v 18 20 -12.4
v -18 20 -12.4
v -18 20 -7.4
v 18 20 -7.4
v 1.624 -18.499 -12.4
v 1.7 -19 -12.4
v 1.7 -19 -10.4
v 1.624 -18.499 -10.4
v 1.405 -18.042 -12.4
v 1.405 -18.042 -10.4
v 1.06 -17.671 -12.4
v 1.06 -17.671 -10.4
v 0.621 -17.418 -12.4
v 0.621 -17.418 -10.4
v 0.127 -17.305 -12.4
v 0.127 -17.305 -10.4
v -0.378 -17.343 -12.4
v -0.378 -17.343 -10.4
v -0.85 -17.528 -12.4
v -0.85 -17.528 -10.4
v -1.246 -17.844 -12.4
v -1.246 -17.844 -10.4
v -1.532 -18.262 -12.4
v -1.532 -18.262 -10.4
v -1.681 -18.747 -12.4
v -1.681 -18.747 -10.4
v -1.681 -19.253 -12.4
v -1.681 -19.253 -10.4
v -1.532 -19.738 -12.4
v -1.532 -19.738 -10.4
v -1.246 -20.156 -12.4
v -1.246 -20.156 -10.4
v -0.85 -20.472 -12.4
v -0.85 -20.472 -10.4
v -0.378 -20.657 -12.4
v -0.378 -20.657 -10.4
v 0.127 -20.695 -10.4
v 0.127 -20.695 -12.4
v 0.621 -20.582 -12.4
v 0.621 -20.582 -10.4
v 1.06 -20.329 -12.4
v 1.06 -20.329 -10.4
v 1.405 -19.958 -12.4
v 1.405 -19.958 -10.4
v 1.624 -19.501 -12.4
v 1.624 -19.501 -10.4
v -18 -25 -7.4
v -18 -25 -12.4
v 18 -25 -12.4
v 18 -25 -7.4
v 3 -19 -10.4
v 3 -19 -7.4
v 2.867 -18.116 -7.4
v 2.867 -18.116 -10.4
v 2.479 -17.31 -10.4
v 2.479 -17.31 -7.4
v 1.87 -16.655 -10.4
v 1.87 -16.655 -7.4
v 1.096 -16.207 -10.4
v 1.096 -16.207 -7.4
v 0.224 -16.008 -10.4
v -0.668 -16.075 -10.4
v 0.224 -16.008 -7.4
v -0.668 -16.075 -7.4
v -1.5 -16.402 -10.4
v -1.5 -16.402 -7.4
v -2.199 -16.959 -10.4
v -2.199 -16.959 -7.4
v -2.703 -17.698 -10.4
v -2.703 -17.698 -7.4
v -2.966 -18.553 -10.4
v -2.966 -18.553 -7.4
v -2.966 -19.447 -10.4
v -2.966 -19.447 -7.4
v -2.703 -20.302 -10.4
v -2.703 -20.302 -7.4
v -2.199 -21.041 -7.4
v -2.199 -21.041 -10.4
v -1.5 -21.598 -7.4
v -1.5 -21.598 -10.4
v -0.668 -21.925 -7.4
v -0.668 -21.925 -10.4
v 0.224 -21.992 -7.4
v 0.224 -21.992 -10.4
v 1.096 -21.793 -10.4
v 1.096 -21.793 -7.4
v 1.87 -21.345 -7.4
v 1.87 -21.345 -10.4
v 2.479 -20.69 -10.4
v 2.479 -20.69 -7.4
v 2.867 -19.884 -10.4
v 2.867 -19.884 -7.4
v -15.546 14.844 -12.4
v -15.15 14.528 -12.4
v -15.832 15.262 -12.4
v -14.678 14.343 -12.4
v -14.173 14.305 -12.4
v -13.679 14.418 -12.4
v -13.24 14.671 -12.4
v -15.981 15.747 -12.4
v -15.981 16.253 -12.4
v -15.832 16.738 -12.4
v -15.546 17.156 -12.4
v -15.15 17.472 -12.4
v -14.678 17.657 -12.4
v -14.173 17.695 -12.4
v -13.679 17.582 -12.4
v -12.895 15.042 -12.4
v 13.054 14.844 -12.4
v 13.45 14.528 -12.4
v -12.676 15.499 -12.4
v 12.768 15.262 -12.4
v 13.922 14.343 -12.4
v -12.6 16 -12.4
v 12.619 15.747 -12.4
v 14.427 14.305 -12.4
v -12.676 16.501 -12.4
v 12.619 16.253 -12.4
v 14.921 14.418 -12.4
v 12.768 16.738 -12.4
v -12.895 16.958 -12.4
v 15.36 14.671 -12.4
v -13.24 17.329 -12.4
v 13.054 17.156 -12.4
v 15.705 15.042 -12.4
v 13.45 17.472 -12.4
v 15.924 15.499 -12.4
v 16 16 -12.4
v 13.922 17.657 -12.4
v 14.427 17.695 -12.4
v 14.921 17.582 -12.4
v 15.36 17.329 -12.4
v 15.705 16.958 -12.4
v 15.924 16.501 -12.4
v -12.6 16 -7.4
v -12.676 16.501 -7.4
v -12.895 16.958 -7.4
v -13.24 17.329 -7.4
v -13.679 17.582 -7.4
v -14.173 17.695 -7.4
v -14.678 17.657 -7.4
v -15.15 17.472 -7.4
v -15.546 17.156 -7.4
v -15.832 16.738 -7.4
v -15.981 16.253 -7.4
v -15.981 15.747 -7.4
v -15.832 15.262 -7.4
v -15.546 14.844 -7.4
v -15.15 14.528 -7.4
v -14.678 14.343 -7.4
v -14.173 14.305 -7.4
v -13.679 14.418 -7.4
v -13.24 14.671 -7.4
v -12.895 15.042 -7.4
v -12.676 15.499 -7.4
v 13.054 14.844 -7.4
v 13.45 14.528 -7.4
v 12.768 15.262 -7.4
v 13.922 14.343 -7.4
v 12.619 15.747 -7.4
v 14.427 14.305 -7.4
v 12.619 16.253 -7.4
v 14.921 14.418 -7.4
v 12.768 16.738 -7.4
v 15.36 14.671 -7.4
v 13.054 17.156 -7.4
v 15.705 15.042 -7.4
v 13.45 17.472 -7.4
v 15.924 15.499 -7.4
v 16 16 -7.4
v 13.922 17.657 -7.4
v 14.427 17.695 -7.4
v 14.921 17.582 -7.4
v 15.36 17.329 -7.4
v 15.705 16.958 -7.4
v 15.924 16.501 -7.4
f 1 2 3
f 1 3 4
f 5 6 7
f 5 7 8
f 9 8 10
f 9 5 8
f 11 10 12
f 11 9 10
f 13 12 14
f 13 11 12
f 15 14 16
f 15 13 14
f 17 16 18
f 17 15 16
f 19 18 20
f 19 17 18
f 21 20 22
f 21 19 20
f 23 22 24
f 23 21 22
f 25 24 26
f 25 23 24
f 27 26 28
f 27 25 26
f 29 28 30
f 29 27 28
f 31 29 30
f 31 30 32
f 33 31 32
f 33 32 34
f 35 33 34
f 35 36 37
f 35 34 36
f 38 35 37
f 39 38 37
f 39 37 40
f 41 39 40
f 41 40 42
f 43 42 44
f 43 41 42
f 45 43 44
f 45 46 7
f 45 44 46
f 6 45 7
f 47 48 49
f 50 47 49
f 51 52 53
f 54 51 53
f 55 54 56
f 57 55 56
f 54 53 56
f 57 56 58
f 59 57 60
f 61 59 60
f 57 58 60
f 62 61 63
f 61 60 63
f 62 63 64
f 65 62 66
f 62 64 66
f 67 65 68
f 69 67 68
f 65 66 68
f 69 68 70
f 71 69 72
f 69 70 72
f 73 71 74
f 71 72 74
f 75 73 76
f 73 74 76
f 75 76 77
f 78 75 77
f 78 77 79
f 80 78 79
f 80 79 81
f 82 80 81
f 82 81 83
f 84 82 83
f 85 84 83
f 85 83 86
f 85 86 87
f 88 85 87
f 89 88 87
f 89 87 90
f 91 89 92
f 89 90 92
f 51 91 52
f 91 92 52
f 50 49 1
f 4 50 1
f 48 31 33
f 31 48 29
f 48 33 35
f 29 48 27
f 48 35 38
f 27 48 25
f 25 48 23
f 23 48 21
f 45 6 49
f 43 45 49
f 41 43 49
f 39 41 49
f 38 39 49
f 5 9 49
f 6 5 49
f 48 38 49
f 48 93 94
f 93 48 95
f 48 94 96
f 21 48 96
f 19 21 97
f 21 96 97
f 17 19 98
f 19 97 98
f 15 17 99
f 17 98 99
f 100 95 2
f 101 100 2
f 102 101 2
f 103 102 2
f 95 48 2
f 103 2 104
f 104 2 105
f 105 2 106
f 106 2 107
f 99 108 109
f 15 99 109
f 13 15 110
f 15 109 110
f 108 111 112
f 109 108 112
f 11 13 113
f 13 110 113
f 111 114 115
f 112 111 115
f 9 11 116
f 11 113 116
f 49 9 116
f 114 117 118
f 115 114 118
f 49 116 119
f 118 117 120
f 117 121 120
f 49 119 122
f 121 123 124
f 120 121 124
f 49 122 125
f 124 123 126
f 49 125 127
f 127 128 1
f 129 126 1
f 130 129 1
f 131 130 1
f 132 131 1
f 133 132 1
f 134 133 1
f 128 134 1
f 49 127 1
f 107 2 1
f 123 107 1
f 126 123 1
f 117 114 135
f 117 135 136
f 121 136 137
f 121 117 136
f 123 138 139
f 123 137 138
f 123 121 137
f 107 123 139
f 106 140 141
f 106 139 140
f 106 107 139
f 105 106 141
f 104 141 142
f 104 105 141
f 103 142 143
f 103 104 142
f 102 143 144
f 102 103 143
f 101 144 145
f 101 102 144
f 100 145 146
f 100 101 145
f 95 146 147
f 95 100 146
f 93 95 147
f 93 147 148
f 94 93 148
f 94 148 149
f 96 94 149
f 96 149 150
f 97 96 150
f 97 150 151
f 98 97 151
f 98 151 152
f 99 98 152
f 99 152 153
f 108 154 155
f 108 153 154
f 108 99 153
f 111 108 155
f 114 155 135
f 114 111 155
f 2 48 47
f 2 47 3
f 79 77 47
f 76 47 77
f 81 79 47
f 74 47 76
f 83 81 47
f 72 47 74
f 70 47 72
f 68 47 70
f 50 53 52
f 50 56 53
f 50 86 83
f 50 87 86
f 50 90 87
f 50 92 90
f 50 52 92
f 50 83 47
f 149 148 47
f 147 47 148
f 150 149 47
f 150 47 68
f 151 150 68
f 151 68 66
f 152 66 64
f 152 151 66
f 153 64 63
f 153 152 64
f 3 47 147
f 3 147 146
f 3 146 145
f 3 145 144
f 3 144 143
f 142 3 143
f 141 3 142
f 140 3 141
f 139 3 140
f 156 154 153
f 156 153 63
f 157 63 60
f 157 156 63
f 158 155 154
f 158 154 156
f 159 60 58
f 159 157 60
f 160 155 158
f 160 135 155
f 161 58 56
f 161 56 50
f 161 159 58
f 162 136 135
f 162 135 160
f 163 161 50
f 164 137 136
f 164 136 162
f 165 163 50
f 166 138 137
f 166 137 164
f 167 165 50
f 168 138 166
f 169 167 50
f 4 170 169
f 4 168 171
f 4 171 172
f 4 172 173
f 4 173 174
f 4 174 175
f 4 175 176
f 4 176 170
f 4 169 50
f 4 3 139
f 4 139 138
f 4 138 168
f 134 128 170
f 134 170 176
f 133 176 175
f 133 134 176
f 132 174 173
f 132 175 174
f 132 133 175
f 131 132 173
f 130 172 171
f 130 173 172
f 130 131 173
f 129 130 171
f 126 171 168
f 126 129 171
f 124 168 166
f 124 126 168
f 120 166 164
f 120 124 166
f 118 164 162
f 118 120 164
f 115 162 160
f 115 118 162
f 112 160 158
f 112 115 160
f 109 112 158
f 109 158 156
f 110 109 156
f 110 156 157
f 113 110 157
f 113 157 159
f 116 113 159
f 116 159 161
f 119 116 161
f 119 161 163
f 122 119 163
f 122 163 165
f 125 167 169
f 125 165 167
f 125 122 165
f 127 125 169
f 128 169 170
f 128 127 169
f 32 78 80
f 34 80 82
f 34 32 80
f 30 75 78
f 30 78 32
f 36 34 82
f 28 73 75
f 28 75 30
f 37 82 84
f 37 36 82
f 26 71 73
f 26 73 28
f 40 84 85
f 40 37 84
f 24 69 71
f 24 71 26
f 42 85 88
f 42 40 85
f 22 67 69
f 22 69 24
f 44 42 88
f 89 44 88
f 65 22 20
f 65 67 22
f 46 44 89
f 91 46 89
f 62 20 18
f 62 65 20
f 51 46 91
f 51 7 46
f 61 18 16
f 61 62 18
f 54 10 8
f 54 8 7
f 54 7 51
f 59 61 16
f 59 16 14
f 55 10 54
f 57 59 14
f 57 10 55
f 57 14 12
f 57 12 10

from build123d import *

# Parameters (mm, degrees)
SKETCH025_R     = 1.7
PAD021_DEPTH    = 100
BOX_W           = 36
BOX_H           = 45
BOX_DEPTH       = 5
SKETCH026_R     = 3
POCKET002_DEPTH = 3


with BuildPart() as pad021:
    # Sketch025 → Pad021 (new body)
    with BuildSketch(Plane.XY.offset(-50)):
        with Locations((0, -19)):
            Circle(SKETCH025_R)
        with Locations((-14.3, 16)):
            Circle(SKETCH025_R)
        with Locations((14.3, 16)):
            Circle(SKETCH025_R)
    extrude(amount=PAD021_DEPTH)


with BuildPart() as pocket002:
    # Box → Box (new body)
    with BuildSketch(Plane(origin=(-18, -25, -12.4), x_dir=(1, 0, 0), z_dir=(0, 0, 1))):
        with Locations((18, 22.5)):
            Rectangle(BOX_W, BOX_H)
    extrude(amount=BOX_DEPTH)

    # Cut006: cut Pad021
    add(pad021.part, mode=Mode.SUBTRACT)

    # Sketch026 → Pocket002 (cut)
    with BuildSketch(Plane.XY.offset(-7.4)):
        with Locations((0, -19)):
            Circle(SKETCH026_R)
    extrude(amount=-POCKET002_DEPTH, mode=Mode.SUBTRACT)


solid = pocket002.part
